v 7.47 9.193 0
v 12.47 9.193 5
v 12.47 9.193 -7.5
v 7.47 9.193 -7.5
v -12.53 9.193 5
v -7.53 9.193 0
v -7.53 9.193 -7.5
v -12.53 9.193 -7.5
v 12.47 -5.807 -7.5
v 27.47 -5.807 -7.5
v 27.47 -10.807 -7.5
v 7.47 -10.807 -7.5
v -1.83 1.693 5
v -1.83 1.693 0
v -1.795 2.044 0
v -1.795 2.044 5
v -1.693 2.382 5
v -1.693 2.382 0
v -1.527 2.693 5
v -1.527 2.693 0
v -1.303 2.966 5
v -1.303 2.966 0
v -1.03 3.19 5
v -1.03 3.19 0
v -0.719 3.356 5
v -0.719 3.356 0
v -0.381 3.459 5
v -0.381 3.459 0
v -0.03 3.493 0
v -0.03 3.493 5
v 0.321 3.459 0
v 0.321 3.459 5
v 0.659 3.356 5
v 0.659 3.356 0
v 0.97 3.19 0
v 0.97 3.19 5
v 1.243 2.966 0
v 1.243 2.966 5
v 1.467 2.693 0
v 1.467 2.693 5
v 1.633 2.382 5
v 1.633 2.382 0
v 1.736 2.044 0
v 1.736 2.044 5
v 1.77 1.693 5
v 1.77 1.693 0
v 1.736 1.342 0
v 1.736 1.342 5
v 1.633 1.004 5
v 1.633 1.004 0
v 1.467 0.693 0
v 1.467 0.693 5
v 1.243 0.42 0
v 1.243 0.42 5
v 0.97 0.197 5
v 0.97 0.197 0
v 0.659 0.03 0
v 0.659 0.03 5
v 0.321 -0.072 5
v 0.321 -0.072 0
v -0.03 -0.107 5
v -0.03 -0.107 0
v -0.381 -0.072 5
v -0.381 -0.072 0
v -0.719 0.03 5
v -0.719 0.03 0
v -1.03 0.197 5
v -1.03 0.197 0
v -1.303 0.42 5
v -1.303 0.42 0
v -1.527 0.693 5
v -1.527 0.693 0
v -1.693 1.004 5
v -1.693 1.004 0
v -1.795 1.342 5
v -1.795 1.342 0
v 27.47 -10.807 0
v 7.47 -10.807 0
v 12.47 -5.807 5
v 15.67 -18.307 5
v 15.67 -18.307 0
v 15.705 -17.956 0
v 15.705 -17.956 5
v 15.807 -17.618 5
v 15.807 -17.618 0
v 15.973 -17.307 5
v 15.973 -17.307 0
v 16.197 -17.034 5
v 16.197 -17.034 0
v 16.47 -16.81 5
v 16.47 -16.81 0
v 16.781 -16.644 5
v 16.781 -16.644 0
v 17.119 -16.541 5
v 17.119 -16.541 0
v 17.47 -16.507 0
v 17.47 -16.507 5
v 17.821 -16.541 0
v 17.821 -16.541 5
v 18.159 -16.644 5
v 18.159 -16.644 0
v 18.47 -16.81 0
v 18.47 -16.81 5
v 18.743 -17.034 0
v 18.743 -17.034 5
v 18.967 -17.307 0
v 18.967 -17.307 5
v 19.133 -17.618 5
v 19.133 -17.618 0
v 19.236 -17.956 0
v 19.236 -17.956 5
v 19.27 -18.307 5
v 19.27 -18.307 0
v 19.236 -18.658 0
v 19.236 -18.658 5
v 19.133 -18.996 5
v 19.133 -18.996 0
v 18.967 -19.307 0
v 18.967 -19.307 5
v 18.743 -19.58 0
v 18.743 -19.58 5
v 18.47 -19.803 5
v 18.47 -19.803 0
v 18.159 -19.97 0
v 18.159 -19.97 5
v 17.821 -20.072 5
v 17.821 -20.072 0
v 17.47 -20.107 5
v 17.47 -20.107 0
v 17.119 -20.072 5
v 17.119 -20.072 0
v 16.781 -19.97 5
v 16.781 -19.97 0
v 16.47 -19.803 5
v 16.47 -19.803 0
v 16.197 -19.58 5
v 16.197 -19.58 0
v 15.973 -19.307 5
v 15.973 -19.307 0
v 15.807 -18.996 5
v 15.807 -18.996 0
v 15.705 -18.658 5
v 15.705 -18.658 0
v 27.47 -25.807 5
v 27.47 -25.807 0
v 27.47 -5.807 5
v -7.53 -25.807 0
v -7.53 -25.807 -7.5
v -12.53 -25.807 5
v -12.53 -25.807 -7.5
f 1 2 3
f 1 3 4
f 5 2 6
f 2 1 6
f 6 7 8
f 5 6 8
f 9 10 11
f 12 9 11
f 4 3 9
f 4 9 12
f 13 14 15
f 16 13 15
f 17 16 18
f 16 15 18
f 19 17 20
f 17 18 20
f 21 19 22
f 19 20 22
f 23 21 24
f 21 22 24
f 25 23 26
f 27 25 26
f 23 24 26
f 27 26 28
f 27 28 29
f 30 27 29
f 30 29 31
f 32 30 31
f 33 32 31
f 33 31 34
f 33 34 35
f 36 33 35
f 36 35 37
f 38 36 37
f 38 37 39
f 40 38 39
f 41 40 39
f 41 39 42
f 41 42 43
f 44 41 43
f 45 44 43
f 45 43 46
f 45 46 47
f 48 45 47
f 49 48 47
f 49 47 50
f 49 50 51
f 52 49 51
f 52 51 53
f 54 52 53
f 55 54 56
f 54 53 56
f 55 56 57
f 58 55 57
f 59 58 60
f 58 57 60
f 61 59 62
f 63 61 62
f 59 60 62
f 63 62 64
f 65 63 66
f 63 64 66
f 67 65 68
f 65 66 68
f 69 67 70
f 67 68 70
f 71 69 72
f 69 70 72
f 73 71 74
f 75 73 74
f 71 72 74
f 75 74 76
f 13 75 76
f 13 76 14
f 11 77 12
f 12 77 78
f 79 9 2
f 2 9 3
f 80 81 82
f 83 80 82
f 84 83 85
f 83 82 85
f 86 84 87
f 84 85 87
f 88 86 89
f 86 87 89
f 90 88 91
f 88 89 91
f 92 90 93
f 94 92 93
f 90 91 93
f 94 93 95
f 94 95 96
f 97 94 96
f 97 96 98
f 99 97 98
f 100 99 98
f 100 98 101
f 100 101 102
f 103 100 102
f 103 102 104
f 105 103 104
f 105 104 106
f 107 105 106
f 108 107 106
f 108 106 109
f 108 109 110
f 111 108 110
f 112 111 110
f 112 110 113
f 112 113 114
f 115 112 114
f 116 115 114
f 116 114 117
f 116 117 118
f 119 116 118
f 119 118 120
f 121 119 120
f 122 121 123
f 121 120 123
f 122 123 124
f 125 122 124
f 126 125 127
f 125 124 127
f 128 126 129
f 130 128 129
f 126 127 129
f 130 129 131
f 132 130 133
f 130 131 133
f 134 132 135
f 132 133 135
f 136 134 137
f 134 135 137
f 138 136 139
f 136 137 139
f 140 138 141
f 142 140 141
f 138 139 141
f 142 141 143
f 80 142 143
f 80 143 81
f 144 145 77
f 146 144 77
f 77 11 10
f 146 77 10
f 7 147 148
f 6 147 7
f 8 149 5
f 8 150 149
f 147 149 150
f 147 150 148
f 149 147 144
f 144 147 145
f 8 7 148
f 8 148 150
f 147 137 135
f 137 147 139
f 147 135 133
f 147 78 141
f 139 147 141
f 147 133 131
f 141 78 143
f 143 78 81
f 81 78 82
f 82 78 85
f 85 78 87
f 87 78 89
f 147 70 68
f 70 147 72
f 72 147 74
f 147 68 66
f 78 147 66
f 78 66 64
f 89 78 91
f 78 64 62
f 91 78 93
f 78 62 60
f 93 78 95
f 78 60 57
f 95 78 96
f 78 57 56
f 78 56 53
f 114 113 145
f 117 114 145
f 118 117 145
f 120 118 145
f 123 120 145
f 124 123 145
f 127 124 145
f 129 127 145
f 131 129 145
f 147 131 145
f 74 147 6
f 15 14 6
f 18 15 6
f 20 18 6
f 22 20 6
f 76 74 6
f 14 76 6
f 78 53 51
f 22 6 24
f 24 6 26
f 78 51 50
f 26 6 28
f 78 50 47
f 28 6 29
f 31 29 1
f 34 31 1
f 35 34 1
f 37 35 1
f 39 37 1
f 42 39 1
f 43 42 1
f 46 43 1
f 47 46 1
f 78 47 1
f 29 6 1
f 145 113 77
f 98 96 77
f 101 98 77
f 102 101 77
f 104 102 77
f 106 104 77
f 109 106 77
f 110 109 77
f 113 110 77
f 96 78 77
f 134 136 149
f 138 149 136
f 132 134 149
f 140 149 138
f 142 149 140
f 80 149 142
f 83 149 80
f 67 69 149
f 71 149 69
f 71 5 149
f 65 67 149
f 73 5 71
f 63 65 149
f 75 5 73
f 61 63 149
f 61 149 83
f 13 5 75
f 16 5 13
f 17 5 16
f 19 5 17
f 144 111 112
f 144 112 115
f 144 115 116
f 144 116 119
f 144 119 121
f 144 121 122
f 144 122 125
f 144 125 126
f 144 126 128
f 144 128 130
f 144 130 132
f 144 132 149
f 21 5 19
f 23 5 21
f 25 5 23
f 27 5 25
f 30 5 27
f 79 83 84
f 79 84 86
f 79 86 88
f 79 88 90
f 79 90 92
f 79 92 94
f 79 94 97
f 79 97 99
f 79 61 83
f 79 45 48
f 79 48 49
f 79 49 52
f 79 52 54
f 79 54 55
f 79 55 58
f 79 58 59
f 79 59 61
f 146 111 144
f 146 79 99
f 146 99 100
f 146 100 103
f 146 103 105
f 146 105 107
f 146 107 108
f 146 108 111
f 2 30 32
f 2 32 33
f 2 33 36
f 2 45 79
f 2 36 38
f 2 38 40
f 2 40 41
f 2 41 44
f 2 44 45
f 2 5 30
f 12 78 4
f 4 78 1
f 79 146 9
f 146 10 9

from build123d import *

# Parameters (mm, degrees)
BOSS_EXTRUDE1_DEPTH = 5
BOSS_EXTRUDE2_DEPTH = 7.5
SKETCH3_W           = 5
SKETCH3_H           = 35
BOSS_EXTRUDE3_DEPTH = 7.5
SKETCH4_W           = 5
SKETCH4_H           = 35
BOSS_EXTRUDE4_DEPTH = 5
BOSS_EXTRUDE5_DEPTH = 5
SKETCH7_R           = 1.8
CUT_EXTRUDE1_DEPTH  = 6


with BuildPart() as part:
    # Sketch1 → Boss-Extrude1 (new body)
    with BuildSketch(Plane.XY):
        Polygon((-7.529880478, -25.806772908), (27.470119522, -25.806772908), (27.470119522, -10.806772908), (7.470119522, -10.806772908), (7.470119522, 9.193227092), (-7.529880478, 9.193227092), align=None)
    extrude(amount=BOSS_EXTRUDE1_DEPTH)



with BuildPart() as body_2:
    # Sketch2 → Boss-Extrude2 (new body)
    with BuildSketch(Plane(origin=(0, 0, 0), x_dir=(-1, 0, 0), z_dir=(0, 0, -1))):
        Polygon((-7.470119522, 9.193227092), (-12.470119522, 9.193227092), (-12.470119522, -5.806772908), (-27.470119522, -5.806772908), (-27.470119522, -10.806772908), (-7.470119522, -10.806772908), align=None)
    extrude(amount=BOSS_EXTRUDE2_DEPTH)


with BuildPart() as body_3:
    # Sketch3 → Boss-Extrude3 (new body)
    with BuildSketch(Plane(origin=(0, 0, 0), x_dir=(-1, 0, 0), z_dir=(0, 0, -1))):
        with Locations((10.029880478, -8.306772908)):
            Rectangle(SKETCH3_W, SKETCH3_H)
    extrude(amount=BOSS_EXTRUDE3_DEPTH)


with BuildPart() as part_1:
    add(part.part)

    add(body_3.part)  # Boss-Extrude4 merges body 3
    # Sketch4 → Boss-Extrude4 (add)
    with BuildSketch(Plane.XY):
        with Locations((-10.029880478, -8.306772908)):
            Rectangle(SKETCH4_W, SKETCH4_H)
    extrude(amount=BOSS_EXTRUDE4_DEPTH)


    add(body_2.part)  # Boss-Extrude5 merges body 2
    # Sketch5 → Boss-Extrude5 (add)
    with BuildSketch(Plane.XY):
        Polygon((7.470119522, 9.193227092), (7.470119522, -10.806772908), (27.470119522, -10.806772908), (27.470119522, -5.806772908), (12.470119522, -5.806772908), (12.470119522, 9.193227092), align=None)
    extrude(amount=BOSS_EXTRUDE5_DEPTH)

    # Sketch7 → Cut-Extrude1 (cut, through all)
    with BuildSketch(Plane(origin=(0, 0, 0), x_dir=(-1, 0, 0), z_dir=(0, 0, -1))):
        with Locations((0.029880478, 1.693227092)):
            Circle(SKETCH7_R)
        with Locations((-17.470119522, -18.306772908)):
            Circle(SKETCH7_R)
    extrude(amount=-CUT_EXTRUDE1_DEPTH, mode=Mode.SUBTRACT)


solid = part_1.part
